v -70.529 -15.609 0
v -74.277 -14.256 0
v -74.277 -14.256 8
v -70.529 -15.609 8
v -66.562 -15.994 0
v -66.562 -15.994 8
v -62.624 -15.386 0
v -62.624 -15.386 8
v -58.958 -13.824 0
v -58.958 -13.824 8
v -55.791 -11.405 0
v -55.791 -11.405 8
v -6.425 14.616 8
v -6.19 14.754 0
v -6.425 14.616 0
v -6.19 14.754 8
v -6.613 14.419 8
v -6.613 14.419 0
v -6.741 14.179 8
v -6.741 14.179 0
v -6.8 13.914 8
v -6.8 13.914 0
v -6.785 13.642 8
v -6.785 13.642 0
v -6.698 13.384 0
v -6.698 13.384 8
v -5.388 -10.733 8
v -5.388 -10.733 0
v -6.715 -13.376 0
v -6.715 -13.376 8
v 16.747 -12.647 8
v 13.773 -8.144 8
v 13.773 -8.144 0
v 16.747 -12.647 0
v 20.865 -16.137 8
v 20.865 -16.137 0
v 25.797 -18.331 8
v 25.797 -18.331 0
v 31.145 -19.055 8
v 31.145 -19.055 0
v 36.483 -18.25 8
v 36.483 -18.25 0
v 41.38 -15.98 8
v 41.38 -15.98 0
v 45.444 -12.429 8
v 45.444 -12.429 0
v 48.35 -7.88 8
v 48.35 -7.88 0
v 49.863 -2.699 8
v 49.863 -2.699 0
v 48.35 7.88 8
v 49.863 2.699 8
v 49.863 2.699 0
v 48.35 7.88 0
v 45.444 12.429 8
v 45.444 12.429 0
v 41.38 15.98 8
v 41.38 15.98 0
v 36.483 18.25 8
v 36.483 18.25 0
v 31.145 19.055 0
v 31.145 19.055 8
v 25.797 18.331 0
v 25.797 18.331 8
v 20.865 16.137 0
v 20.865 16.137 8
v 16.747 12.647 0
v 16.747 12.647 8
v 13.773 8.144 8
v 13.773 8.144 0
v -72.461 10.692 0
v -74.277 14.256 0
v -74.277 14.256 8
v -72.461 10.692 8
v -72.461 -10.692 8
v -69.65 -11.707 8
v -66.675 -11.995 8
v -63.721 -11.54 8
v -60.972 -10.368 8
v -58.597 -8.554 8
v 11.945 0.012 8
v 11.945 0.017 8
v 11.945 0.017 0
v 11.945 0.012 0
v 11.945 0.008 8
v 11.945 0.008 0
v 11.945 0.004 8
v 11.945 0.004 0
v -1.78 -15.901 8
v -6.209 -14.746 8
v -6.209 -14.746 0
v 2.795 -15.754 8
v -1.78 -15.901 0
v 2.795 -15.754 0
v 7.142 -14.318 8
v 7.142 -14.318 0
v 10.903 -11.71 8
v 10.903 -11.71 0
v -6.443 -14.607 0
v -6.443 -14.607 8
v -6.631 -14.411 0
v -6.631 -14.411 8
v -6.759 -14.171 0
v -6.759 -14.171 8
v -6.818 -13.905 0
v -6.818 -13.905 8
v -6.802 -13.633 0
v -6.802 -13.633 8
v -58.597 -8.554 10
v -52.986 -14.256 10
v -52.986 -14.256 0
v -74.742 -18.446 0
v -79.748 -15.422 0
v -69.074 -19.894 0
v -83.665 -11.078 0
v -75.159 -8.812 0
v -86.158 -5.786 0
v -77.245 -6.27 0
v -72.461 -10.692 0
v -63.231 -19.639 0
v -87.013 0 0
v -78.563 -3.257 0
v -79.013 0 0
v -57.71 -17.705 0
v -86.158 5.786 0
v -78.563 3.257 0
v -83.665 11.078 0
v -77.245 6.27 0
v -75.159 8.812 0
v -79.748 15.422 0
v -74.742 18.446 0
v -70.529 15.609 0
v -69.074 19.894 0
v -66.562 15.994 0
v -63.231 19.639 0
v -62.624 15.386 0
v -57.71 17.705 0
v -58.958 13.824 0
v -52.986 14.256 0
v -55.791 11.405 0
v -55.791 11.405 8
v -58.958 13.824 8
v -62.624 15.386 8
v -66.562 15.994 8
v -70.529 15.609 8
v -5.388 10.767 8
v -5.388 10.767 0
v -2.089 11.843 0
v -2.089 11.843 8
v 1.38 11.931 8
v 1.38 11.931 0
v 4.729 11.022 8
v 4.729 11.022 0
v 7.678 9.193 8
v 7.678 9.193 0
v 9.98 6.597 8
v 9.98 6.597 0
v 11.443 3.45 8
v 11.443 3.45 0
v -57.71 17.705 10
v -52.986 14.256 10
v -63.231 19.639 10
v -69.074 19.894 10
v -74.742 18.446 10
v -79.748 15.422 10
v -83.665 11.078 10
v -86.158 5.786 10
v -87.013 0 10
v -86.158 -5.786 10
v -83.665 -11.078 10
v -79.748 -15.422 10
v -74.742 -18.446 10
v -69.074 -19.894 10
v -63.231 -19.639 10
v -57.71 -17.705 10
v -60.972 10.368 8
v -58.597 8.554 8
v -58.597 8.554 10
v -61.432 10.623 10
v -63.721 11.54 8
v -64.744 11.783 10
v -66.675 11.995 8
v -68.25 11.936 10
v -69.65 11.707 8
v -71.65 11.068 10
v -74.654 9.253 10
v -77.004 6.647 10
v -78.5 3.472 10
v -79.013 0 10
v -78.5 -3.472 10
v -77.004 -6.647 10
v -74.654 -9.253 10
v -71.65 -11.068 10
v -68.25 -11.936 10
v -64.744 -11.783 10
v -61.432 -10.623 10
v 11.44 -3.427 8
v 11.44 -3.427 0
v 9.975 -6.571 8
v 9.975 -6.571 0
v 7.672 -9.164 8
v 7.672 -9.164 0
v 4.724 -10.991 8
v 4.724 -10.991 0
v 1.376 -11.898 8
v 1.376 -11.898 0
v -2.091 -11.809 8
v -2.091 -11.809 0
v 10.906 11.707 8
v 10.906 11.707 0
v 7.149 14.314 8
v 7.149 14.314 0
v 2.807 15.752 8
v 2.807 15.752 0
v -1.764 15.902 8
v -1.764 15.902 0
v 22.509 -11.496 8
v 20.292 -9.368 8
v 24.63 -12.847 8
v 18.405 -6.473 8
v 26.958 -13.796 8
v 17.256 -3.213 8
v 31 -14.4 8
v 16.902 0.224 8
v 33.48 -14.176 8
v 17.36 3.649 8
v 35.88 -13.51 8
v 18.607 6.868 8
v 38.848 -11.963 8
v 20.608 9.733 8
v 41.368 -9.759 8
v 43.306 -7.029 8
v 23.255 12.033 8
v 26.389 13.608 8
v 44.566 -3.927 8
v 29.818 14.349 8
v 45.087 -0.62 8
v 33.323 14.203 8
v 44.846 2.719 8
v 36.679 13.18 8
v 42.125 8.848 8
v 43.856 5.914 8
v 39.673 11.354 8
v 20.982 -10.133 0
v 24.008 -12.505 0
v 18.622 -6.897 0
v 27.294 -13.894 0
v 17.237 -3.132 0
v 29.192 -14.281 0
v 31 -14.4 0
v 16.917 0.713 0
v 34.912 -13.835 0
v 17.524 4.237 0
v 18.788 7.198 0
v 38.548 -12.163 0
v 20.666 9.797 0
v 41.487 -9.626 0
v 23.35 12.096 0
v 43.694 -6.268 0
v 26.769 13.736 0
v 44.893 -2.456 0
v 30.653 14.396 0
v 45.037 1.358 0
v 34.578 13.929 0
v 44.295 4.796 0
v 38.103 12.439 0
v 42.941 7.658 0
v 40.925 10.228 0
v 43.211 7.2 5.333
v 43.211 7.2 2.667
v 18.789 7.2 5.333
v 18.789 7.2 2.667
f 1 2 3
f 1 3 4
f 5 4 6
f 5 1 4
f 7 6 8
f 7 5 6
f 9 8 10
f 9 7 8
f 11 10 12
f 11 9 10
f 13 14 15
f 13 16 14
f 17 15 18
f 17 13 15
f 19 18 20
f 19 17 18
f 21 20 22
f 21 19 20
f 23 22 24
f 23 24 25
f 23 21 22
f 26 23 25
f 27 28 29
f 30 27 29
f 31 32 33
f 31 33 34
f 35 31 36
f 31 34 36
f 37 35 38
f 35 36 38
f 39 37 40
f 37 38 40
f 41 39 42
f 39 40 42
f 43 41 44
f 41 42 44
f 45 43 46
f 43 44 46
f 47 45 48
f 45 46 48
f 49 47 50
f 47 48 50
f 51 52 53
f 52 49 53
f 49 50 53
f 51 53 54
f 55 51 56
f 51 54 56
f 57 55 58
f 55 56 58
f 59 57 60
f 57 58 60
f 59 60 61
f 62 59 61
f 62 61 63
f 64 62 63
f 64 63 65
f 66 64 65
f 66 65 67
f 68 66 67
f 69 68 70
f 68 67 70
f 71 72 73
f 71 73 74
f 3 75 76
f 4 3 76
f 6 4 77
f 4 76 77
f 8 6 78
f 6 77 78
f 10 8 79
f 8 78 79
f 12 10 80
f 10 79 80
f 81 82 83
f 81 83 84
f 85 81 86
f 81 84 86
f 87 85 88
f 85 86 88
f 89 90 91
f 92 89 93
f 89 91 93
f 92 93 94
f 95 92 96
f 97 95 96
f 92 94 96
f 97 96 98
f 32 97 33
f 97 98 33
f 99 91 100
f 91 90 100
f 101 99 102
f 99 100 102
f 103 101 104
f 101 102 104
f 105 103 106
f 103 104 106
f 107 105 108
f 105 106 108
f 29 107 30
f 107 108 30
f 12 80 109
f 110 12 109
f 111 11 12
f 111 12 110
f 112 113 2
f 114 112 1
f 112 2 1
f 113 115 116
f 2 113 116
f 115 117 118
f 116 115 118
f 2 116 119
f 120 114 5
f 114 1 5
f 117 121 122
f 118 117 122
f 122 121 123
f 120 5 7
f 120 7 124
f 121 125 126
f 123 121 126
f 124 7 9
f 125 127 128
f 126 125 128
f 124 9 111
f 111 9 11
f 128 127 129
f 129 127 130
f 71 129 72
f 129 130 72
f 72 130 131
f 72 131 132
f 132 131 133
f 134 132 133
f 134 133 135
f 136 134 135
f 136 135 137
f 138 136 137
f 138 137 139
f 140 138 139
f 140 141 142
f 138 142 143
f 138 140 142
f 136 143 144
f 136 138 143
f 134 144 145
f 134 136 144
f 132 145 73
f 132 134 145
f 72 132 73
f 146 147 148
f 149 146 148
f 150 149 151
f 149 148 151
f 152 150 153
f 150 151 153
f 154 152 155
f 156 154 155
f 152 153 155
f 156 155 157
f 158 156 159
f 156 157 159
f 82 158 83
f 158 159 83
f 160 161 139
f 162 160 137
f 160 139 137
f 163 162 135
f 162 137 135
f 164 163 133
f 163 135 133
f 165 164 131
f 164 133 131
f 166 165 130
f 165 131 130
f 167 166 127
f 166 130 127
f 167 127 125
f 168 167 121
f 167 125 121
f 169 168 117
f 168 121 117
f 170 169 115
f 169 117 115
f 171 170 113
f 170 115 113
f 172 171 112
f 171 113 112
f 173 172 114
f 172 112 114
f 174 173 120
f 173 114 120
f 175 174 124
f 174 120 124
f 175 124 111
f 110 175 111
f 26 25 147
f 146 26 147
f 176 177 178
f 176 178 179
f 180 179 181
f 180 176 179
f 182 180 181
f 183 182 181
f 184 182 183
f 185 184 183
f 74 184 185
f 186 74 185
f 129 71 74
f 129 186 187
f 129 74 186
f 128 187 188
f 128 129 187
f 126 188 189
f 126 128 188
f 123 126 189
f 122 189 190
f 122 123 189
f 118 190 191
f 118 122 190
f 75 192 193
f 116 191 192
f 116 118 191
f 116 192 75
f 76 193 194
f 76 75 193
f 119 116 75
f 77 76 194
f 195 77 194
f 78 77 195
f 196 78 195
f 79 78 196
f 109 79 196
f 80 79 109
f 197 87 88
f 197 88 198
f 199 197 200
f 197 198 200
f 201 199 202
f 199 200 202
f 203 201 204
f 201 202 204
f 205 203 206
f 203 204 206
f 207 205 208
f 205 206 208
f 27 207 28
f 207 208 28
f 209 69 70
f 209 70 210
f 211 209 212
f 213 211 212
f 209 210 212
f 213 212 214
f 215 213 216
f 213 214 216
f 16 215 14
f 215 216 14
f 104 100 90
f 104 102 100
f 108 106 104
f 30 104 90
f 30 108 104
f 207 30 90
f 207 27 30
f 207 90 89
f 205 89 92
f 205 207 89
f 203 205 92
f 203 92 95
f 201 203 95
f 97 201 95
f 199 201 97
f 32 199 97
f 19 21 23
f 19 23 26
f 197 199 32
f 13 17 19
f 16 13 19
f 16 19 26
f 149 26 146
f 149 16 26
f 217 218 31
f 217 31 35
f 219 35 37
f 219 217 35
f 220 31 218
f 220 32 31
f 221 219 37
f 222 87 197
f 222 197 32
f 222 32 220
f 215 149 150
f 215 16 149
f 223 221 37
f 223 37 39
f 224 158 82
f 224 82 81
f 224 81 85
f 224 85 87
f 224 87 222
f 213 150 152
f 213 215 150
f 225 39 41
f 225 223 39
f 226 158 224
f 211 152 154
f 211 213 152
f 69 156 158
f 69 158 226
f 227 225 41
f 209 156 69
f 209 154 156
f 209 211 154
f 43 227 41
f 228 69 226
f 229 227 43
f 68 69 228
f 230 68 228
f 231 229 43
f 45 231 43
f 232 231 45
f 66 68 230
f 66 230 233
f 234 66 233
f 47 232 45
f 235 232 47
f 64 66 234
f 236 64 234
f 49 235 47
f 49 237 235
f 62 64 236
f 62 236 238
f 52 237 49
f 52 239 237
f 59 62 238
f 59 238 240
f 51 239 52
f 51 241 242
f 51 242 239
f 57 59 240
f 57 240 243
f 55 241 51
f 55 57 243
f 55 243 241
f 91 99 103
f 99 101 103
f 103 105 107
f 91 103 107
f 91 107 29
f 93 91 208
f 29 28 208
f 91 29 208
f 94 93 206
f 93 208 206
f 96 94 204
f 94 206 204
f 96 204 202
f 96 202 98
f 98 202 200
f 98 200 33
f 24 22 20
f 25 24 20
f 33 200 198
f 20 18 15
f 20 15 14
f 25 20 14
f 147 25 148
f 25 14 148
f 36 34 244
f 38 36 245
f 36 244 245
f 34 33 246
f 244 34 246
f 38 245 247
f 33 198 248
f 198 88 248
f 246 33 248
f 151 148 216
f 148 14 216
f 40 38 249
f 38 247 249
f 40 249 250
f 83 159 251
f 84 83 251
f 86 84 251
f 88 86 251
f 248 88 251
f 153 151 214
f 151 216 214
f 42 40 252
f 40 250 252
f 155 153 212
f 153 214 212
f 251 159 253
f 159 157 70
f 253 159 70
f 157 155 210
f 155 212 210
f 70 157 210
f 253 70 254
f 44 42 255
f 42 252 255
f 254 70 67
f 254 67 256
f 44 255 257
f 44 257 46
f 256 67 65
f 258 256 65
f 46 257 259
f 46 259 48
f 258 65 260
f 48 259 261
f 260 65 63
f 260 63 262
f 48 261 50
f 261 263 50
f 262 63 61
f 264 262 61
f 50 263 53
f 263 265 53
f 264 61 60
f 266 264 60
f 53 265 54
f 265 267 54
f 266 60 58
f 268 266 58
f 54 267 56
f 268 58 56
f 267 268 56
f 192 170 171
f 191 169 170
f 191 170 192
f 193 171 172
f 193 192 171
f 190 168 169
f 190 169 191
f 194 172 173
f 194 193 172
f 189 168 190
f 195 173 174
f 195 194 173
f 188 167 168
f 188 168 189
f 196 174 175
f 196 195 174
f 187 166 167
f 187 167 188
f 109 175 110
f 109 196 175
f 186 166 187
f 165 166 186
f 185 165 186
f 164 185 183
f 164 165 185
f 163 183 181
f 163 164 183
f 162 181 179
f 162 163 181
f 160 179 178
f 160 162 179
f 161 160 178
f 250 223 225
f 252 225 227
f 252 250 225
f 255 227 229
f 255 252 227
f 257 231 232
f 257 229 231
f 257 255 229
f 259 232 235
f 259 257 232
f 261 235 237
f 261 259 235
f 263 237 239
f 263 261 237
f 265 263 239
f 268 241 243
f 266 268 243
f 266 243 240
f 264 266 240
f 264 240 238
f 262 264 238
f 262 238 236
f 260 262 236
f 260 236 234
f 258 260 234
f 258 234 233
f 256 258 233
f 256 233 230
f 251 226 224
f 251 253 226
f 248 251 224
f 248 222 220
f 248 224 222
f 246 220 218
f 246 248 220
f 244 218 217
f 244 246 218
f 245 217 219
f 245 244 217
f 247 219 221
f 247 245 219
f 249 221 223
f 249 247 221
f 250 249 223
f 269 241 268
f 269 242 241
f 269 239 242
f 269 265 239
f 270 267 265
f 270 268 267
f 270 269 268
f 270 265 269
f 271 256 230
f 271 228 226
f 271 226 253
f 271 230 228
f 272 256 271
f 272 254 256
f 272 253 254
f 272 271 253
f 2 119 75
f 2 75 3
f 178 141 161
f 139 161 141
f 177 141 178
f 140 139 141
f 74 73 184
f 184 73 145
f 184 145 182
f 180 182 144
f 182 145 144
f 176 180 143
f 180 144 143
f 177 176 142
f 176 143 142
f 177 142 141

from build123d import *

# Parameters (mm, degrees)
F1_DEPTH  = 8
F2_R      = 19.0552630213
F3_DEPTH  = 8
F5_DEPTH  = 8.001
F6_R      = 1
F7_R      = 20
F7_R_2    = 12
F8_DEPTH  = 10
F10_DEPTH = 8
F12_DEPTH = 10.001


with BuildPart() as f1:
    # F0 (on Top) → F1 (new body)
    with BuildSketch(Plane.XY):
        with BuildLine():
            Line((-5.3879410167, -10.7332278011), (-7.1781391155, -14.2994516971))
            ThreePointArc((-7.1781391155, -14.2994516971), (15.9999968752, -0.0099997218), (-7.160259694, 14.3084129488))
            Line((-7.160259694, 14.3084129488), (-5.3879410167, 10.7667721989))
            ThreePointArc((-5.3879410167, 10.7667721989), (11.9447412353, 0.0167721989), (-5.3879410167, -10.7332278011))
        make_face()
    extrude(amount=F1_DEPTH)

    # F2 (on Top) → F3 (join, through all)
    with BuildSketch(Plane.XY):
        with Locations((30.9999968752, 0)):
            Circle(F2_R)
    extrude(amount=F3_DEPTH)

    # F4 (on Top) → F5 (cut, through all)
    with BuildSketch(Plane.XY):
        with BuildLine():
            add(Edge.make_bspline(
                [(30.9999968752, -14.4), (55.4219132619, -14.4), (43.2109550685, 7.2), (30.9999968752, 28.8), (18.7890386818, 7.2), (6.5780804885, -14.4), (30.9999968752, -14.4)],
                knots=[0, 0, 0, 2.0943951024, 2.0943951024, 4.1887902048, 4.1887902048, 6.2831853072, 6.2831853072, 6.2831853072], degree=2, weights=[1, 0.5, 1, 0.5, 1, 0.5, 1]))
        make_face()
    extrude(amount=F5_DEPTH, mode=Mode.SUBTRACT)

    # F6
    f6_edges = [f1.edges().sort_by_distance(p)[0] for p in [
        (-7.178139, -14.299452, 4),
        (-7.16026, 14.308413, 4),
    ]]
    fillet(f6_edges, radius=F6_R)


with BuildPart() as f8:
    # F7 (on Top) → F8 (new body)
    with BuildSketch(Plane.XY):
        with Locations((-67.0132264495, 0)):
            Circle(F7_R)
        with Locations((-67.0132264495, 0)):
            Circle(F7_R_2, mode=Mode.SUBTRACT)
    extrude(amount=F8_DEPTH)

    # F9 (on Top) → F10 (cut, through all)
    with BuildSketch(Plane.XY):
        with BuildLine():
            Line((-67.0132264495, 0), (-74.2770744453, -14.256104387))
            ThreePointArc((-74.2770744453, -14.256104387), (-51.0132264495, 0), (-74.2770744453, 14.256104387))
            Line((-74.2770744453, 14.256104387), (-67.0132264495, 0))
        make_face()
    extrude(amount=F10_DEPTH, mode=Mode.SUBTRACT)

    # F11 (on Top) → F12 (cut, through all)
    with BuildSketch(Plane.XY):
        with BuildLine():
            Line((-52.9859855338, 14.256104387), (-67.0132264495, 0))
            Line((-67.0132264495, 0), (-52.9859855338, -14.256104387))
            ThreePointArc((-52.9859855338, -14.256104387), (-47.0132264495, 0), (-52.9859855338, 14.256104387))
        make_face()
    extrude(amount=F12_DEPTH, mode=Mode.SUBTRACT)


solid = Compound([f1.part, f8.part])
